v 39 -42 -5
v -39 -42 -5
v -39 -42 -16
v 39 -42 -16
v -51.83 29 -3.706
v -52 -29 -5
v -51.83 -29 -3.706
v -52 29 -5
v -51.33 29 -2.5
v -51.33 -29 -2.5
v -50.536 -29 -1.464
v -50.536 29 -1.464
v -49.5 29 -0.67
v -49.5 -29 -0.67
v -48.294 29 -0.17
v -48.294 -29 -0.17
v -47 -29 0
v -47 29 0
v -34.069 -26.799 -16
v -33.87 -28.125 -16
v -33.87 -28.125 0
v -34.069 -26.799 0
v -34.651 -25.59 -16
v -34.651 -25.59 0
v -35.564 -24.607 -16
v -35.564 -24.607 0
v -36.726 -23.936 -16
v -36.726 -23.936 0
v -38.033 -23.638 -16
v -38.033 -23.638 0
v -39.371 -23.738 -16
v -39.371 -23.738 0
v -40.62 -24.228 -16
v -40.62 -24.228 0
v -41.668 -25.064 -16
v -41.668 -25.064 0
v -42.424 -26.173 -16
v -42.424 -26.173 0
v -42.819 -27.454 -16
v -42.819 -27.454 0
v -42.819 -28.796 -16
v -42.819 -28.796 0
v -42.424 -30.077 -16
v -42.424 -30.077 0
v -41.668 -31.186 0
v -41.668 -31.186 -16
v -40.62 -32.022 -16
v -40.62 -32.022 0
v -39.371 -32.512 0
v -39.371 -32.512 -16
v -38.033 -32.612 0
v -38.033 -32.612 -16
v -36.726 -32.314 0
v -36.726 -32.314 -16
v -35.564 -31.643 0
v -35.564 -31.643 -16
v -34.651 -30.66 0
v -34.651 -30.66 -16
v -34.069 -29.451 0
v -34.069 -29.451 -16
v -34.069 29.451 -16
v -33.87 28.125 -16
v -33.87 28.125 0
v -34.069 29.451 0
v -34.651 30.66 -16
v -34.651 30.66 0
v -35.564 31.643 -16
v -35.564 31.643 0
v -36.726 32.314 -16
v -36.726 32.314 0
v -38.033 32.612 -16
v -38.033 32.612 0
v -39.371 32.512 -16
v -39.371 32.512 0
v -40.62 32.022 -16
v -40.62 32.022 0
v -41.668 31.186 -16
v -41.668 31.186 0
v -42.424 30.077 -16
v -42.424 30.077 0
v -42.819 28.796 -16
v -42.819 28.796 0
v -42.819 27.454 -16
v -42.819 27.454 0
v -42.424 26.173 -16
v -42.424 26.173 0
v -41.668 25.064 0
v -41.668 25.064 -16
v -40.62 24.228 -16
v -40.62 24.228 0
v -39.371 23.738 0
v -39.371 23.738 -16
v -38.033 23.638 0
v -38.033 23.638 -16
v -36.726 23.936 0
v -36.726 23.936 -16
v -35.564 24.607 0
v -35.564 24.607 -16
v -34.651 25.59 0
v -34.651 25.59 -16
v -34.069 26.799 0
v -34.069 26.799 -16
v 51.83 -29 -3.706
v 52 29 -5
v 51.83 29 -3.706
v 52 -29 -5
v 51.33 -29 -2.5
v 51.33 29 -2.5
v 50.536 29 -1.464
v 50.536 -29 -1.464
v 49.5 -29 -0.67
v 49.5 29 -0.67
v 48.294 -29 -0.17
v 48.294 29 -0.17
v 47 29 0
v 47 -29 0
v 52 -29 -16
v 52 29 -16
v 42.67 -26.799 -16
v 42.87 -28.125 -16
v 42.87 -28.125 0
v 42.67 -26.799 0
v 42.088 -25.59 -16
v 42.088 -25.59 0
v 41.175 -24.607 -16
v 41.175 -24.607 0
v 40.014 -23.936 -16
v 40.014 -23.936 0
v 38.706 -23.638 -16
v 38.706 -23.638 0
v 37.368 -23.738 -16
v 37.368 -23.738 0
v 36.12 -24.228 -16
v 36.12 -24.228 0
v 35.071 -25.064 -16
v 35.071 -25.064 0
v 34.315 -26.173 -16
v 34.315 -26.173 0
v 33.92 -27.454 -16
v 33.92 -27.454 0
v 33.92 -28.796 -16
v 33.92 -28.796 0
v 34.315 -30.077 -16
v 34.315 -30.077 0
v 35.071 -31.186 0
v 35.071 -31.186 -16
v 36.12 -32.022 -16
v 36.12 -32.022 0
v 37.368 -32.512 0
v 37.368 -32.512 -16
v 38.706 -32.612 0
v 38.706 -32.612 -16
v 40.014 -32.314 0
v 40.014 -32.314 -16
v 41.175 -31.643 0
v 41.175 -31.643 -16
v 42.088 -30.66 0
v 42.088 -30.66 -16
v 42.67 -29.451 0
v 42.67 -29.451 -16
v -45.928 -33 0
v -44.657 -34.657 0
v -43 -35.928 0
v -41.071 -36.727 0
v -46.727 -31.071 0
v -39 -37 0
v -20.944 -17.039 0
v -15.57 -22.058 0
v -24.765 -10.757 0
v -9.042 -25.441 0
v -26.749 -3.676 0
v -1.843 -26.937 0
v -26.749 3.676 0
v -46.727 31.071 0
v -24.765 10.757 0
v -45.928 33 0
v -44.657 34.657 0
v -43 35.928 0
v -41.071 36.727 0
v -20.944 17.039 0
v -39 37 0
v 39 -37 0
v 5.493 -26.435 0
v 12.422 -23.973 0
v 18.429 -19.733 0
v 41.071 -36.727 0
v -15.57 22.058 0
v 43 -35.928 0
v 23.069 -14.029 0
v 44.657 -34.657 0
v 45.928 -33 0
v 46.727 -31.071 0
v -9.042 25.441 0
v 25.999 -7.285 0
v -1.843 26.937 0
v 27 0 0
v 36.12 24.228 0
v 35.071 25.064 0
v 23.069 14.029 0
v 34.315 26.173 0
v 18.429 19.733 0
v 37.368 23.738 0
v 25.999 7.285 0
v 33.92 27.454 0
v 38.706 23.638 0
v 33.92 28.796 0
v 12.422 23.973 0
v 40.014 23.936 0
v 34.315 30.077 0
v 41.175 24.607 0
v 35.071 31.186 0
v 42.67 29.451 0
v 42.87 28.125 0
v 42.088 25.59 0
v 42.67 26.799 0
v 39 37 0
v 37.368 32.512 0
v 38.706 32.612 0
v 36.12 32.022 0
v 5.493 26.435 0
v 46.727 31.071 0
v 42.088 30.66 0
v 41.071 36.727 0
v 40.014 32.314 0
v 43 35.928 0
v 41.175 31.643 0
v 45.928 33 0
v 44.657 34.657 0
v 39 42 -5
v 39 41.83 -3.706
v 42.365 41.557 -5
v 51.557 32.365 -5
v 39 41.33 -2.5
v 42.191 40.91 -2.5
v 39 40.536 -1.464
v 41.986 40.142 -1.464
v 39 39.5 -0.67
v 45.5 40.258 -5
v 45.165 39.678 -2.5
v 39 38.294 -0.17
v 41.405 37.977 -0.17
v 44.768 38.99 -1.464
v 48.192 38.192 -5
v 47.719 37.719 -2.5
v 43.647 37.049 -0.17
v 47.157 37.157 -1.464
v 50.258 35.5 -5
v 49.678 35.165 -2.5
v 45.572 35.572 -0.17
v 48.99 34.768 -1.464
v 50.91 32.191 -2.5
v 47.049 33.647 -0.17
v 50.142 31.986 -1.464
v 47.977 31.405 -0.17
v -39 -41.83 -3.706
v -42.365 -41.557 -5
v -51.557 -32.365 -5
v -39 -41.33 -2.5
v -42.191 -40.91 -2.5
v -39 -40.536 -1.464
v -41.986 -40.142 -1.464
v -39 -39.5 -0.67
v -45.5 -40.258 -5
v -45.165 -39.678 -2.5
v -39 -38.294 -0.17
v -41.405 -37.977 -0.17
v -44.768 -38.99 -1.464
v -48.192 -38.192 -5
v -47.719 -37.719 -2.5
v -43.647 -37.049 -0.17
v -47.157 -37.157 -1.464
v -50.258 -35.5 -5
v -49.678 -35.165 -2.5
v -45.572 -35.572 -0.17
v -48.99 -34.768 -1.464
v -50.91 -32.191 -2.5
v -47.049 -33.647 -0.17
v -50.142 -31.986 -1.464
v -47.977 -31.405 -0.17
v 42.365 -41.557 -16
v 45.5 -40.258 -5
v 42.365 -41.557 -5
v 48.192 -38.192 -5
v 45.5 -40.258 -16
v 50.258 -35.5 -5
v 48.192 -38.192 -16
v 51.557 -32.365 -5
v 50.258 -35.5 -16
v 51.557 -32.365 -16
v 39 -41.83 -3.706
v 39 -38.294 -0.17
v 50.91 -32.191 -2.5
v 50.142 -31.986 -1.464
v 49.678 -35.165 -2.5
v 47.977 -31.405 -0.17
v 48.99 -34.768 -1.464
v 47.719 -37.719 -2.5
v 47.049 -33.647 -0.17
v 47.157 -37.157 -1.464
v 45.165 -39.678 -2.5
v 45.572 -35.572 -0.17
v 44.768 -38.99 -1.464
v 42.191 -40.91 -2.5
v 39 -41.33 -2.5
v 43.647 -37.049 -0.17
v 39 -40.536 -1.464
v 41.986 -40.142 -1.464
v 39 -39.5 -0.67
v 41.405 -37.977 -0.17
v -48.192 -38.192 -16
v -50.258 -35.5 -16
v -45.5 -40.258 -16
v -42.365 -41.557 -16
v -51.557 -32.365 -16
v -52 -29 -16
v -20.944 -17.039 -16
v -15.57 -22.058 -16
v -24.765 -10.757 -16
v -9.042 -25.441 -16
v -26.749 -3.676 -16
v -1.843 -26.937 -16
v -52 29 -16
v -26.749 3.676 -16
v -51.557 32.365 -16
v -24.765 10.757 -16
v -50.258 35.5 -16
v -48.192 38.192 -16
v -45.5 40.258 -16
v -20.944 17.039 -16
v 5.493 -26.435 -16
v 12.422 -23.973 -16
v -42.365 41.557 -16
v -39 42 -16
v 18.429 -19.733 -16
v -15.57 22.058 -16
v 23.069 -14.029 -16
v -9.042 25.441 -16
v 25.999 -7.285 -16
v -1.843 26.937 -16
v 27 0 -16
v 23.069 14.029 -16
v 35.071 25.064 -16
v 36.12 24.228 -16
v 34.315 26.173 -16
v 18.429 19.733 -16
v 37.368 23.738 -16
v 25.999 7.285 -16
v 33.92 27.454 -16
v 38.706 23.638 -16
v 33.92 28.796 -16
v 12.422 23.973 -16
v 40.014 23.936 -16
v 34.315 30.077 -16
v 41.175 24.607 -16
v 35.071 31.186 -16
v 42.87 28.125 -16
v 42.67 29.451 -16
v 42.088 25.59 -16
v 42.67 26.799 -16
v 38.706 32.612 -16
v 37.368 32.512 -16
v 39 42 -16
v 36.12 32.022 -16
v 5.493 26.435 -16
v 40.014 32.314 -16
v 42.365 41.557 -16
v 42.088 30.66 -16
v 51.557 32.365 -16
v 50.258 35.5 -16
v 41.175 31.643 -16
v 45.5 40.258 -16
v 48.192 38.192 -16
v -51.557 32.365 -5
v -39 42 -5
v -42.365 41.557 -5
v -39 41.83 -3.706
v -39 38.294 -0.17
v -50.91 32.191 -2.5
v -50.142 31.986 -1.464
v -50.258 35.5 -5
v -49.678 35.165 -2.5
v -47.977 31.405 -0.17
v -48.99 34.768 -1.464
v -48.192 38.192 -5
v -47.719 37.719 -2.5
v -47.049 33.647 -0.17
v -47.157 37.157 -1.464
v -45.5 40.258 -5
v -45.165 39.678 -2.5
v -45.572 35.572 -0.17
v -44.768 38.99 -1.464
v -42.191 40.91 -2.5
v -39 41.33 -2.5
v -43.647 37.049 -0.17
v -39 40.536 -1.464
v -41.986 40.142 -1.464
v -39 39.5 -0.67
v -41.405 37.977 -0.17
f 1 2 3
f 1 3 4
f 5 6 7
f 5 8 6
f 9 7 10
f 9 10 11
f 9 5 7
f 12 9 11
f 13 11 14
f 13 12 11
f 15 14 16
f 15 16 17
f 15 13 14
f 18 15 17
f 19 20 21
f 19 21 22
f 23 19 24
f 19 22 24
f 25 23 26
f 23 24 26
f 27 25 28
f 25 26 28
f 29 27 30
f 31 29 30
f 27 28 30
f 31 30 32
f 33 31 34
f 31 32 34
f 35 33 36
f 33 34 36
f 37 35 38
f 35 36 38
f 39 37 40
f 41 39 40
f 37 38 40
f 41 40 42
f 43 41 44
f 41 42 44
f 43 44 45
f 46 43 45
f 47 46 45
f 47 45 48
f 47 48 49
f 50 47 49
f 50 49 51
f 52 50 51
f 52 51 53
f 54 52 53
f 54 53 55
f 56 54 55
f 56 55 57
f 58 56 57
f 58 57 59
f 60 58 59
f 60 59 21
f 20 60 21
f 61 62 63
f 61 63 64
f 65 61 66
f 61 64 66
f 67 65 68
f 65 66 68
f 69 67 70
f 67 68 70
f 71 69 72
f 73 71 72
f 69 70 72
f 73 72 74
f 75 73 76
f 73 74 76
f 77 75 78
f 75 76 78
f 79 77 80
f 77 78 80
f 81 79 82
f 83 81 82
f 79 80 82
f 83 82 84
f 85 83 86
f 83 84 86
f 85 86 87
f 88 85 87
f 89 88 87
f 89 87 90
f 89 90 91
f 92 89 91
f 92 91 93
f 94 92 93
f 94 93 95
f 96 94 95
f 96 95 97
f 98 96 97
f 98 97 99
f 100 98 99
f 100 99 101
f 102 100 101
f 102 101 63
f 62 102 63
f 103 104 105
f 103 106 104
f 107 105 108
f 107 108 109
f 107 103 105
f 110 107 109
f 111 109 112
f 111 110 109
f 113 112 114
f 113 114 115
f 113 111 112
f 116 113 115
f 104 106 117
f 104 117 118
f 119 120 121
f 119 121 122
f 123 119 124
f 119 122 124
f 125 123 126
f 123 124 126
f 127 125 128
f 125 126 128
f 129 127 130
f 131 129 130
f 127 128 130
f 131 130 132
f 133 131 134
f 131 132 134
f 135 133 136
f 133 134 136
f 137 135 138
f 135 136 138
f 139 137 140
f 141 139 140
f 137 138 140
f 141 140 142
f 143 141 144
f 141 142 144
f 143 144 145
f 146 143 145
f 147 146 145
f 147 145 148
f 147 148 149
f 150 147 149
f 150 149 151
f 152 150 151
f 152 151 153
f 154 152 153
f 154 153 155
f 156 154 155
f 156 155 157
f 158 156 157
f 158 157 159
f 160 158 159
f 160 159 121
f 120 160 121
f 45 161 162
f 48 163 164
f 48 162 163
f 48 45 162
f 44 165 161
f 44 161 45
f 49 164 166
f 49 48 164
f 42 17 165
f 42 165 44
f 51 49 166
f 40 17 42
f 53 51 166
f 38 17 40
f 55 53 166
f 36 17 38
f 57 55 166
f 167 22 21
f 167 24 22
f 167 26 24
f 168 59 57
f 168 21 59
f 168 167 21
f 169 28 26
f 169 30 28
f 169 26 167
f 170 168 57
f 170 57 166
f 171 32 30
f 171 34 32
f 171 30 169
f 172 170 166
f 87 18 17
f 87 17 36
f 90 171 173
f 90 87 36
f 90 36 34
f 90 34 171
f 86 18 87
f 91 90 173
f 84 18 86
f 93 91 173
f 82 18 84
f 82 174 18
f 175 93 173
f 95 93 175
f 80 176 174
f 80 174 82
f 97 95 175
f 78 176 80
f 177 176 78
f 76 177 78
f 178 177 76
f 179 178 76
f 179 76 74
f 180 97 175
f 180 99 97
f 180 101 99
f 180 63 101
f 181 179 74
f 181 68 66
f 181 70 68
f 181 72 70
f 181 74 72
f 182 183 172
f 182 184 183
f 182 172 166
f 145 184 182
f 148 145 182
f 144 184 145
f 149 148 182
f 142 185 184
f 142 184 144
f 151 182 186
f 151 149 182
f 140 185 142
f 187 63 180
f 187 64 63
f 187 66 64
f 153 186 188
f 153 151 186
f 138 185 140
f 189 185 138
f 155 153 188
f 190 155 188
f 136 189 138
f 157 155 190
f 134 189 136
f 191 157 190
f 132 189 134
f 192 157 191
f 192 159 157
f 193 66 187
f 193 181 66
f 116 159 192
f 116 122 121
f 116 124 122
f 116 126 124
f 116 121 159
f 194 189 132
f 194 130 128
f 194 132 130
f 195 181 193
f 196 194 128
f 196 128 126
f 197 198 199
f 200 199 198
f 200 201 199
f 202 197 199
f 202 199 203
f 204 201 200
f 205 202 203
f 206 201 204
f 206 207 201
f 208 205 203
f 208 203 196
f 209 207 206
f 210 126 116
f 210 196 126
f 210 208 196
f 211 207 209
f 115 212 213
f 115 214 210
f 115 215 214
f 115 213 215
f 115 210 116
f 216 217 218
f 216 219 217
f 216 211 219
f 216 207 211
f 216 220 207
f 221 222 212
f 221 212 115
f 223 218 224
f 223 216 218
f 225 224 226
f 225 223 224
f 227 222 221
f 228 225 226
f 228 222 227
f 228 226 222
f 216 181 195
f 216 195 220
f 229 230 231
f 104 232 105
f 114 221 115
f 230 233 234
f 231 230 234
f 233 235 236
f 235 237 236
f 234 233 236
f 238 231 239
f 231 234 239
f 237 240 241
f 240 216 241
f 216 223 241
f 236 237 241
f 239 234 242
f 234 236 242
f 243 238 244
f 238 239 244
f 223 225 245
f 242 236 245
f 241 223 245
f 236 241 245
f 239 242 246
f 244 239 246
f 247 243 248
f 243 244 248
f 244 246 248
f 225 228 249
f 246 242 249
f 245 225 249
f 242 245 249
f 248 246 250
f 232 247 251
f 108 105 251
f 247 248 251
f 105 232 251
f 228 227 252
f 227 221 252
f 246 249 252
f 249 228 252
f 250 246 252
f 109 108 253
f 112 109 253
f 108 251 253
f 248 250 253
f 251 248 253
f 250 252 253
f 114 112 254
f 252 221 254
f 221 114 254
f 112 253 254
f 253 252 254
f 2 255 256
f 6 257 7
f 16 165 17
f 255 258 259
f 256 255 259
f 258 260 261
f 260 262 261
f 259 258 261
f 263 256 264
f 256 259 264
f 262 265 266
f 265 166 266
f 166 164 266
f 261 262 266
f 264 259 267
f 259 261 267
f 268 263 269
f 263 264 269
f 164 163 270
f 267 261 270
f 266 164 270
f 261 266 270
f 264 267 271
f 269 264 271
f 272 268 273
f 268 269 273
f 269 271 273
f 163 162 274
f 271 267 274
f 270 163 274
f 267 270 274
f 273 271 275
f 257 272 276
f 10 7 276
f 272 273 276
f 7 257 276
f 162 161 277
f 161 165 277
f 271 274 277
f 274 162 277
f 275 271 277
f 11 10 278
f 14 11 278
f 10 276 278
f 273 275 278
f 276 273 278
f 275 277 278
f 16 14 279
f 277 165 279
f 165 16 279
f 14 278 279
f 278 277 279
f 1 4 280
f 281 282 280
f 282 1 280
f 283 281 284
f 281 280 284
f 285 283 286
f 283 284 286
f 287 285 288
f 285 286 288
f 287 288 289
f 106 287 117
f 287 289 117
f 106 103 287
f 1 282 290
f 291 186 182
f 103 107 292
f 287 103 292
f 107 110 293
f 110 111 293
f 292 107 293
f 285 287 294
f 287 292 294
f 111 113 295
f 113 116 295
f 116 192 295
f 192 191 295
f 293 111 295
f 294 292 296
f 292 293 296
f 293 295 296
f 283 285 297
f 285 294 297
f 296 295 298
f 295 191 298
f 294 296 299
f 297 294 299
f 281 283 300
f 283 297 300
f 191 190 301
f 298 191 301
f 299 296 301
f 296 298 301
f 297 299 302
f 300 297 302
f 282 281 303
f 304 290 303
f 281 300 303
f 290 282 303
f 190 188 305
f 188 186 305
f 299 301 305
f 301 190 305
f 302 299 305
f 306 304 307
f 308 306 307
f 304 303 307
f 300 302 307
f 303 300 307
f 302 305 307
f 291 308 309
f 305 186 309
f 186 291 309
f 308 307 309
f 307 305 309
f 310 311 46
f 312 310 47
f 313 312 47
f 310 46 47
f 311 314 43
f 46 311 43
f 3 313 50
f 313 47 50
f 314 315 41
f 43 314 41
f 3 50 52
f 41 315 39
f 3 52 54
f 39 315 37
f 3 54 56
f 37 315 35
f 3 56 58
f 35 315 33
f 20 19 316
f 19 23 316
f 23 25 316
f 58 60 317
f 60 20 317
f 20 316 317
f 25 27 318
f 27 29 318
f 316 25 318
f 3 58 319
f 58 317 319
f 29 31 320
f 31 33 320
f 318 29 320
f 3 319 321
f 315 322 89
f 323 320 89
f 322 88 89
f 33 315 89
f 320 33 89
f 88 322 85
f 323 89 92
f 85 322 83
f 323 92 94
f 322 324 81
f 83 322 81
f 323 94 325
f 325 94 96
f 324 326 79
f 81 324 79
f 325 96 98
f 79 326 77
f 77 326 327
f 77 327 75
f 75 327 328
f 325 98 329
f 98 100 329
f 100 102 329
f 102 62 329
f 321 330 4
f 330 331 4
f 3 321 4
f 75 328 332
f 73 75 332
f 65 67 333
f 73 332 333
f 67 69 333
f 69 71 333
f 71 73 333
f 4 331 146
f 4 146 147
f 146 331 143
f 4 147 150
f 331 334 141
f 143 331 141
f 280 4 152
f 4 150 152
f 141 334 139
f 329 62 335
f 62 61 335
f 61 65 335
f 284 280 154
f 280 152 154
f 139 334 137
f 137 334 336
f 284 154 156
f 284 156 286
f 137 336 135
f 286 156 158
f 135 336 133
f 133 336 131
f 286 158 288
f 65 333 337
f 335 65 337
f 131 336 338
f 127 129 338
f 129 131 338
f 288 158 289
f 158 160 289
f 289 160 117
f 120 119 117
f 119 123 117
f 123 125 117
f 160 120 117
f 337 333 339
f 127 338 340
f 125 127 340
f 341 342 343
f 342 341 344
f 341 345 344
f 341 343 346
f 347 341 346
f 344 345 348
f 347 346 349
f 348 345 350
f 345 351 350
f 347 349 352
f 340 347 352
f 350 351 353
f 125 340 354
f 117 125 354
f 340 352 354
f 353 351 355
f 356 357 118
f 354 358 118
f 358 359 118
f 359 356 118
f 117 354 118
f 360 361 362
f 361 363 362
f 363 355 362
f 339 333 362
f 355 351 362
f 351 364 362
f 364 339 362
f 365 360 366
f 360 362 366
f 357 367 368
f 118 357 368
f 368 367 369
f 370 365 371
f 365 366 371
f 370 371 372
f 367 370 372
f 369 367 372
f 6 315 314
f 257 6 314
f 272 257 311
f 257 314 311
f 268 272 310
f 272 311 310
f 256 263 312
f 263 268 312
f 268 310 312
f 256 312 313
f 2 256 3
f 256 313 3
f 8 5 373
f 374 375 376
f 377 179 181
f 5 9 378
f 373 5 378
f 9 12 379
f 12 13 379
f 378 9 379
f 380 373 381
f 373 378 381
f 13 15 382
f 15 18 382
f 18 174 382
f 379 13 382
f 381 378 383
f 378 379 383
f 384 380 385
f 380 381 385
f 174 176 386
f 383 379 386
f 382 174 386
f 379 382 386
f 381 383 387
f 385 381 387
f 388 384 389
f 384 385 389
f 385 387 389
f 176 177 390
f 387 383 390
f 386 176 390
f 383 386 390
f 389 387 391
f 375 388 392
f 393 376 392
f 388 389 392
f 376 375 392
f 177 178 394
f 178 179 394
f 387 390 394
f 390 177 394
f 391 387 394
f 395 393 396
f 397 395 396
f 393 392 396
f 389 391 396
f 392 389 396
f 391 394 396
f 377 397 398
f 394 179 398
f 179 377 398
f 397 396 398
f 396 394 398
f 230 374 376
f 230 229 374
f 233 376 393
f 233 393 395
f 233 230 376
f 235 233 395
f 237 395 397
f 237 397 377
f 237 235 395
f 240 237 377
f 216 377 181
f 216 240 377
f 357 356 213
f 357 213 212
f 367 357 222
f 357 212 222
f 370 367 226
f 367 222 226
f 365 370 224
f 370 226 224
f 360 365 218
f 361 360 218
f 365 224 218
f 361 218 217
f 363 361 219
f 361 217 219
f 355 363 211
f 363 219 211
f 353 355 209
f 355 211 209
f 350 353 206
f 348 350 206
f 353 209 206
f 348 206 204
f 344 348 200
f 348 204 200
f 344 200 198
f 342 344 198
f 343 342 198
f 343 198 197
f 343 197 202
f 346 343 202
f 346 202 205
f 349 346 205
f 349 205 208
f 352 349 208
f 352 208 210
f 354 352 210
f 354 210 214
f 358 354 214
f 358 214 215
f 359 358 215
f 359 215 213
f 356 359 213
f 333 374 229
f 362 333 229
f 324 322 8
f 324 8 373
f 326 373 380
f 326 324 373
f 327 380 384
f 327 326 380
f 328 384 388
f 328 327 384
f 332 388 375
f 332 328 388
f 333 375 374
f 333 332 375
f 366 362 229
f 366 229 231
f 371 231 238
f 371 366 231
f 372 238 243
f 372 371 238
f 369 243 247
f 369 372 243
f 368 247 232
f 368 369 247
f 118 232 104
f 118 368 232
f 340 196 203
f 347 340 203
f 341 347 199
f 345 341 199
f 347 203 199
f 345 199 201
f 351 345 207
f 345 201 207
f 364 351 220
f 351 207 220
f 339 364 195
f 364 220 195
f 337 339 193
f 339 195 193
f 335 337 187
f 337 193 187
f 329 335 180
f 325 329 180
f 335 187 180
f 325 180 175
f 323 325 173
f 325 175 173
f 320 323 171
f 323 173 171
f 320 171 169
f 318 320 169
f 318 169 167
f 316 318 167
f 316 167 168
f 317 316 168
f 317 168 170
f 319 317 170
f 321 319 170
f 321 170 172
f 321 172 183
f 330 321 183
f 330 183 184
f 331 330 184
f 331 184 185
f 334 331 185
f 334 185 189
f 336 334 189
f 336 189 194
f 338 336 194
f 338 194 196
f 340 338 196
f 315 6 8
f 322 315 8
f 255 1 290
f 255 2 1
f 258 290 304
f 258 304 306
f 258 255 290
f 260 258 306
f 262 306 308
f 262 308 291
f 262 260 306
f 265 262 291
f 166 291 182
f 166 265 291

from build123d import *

# Parameters (mm, degrees)
F0_W     = 104
F0_H     = 84
F1_DEPTH = 16
F3_R     = 4.5
F4_DEPTH = 25
F5_R     = 27
F6_DEPTH = 25
F7_R     = 13
F8_R     = 5


with BuildPart() as f1:
    # F0 (on Top) → F1 (new body)
    with BuildSketch(Plane.XY):
        Rectangle(F0_W, F0_H)
    extrude(amount=-F1_DEPTH)

    # F3 (on face) → F4 (cut)
    with BuildSketch(Plane.XY):
        with Locations((38.36957, 28.125)):
            Circle(F3_R)
        with Locations((38.36957, -28.125)):
            Circle(F3_R)
        with Locations((-38.36957, 28.125)):
            Circle(F3_R)
        with Locations((-38.36957, -28.125)):
            Circle(F3_R)
    extrude(amount=-F4_DEPTH, mode=Mode.SUBTRACT)

    # F5 (on Top) → F6 (cut)
    with BuildSketch(Plane.XY):
        Circle(F5_R)
    extrude(amount=-F6_DEPTH, mode=Mode.SUBTRACT)

    # F7
    f7_edges = [f1.edges().sort_by_distance(p)[0] for p in [
        (-52, 42, -8),
        (-52, -42, -8),
        (52, -42, -8),
        (52, 42, -8),
    ]]
    fillet(f7_edges, radius=F7_R)

    # F8
    f8_edges = [f1.edges().sort_by_distance(p)[0] for p in [
        (-52, 0, 0),
    ]]
    fillet(f8_edges, radius=F8_R)


solid = f1.part
